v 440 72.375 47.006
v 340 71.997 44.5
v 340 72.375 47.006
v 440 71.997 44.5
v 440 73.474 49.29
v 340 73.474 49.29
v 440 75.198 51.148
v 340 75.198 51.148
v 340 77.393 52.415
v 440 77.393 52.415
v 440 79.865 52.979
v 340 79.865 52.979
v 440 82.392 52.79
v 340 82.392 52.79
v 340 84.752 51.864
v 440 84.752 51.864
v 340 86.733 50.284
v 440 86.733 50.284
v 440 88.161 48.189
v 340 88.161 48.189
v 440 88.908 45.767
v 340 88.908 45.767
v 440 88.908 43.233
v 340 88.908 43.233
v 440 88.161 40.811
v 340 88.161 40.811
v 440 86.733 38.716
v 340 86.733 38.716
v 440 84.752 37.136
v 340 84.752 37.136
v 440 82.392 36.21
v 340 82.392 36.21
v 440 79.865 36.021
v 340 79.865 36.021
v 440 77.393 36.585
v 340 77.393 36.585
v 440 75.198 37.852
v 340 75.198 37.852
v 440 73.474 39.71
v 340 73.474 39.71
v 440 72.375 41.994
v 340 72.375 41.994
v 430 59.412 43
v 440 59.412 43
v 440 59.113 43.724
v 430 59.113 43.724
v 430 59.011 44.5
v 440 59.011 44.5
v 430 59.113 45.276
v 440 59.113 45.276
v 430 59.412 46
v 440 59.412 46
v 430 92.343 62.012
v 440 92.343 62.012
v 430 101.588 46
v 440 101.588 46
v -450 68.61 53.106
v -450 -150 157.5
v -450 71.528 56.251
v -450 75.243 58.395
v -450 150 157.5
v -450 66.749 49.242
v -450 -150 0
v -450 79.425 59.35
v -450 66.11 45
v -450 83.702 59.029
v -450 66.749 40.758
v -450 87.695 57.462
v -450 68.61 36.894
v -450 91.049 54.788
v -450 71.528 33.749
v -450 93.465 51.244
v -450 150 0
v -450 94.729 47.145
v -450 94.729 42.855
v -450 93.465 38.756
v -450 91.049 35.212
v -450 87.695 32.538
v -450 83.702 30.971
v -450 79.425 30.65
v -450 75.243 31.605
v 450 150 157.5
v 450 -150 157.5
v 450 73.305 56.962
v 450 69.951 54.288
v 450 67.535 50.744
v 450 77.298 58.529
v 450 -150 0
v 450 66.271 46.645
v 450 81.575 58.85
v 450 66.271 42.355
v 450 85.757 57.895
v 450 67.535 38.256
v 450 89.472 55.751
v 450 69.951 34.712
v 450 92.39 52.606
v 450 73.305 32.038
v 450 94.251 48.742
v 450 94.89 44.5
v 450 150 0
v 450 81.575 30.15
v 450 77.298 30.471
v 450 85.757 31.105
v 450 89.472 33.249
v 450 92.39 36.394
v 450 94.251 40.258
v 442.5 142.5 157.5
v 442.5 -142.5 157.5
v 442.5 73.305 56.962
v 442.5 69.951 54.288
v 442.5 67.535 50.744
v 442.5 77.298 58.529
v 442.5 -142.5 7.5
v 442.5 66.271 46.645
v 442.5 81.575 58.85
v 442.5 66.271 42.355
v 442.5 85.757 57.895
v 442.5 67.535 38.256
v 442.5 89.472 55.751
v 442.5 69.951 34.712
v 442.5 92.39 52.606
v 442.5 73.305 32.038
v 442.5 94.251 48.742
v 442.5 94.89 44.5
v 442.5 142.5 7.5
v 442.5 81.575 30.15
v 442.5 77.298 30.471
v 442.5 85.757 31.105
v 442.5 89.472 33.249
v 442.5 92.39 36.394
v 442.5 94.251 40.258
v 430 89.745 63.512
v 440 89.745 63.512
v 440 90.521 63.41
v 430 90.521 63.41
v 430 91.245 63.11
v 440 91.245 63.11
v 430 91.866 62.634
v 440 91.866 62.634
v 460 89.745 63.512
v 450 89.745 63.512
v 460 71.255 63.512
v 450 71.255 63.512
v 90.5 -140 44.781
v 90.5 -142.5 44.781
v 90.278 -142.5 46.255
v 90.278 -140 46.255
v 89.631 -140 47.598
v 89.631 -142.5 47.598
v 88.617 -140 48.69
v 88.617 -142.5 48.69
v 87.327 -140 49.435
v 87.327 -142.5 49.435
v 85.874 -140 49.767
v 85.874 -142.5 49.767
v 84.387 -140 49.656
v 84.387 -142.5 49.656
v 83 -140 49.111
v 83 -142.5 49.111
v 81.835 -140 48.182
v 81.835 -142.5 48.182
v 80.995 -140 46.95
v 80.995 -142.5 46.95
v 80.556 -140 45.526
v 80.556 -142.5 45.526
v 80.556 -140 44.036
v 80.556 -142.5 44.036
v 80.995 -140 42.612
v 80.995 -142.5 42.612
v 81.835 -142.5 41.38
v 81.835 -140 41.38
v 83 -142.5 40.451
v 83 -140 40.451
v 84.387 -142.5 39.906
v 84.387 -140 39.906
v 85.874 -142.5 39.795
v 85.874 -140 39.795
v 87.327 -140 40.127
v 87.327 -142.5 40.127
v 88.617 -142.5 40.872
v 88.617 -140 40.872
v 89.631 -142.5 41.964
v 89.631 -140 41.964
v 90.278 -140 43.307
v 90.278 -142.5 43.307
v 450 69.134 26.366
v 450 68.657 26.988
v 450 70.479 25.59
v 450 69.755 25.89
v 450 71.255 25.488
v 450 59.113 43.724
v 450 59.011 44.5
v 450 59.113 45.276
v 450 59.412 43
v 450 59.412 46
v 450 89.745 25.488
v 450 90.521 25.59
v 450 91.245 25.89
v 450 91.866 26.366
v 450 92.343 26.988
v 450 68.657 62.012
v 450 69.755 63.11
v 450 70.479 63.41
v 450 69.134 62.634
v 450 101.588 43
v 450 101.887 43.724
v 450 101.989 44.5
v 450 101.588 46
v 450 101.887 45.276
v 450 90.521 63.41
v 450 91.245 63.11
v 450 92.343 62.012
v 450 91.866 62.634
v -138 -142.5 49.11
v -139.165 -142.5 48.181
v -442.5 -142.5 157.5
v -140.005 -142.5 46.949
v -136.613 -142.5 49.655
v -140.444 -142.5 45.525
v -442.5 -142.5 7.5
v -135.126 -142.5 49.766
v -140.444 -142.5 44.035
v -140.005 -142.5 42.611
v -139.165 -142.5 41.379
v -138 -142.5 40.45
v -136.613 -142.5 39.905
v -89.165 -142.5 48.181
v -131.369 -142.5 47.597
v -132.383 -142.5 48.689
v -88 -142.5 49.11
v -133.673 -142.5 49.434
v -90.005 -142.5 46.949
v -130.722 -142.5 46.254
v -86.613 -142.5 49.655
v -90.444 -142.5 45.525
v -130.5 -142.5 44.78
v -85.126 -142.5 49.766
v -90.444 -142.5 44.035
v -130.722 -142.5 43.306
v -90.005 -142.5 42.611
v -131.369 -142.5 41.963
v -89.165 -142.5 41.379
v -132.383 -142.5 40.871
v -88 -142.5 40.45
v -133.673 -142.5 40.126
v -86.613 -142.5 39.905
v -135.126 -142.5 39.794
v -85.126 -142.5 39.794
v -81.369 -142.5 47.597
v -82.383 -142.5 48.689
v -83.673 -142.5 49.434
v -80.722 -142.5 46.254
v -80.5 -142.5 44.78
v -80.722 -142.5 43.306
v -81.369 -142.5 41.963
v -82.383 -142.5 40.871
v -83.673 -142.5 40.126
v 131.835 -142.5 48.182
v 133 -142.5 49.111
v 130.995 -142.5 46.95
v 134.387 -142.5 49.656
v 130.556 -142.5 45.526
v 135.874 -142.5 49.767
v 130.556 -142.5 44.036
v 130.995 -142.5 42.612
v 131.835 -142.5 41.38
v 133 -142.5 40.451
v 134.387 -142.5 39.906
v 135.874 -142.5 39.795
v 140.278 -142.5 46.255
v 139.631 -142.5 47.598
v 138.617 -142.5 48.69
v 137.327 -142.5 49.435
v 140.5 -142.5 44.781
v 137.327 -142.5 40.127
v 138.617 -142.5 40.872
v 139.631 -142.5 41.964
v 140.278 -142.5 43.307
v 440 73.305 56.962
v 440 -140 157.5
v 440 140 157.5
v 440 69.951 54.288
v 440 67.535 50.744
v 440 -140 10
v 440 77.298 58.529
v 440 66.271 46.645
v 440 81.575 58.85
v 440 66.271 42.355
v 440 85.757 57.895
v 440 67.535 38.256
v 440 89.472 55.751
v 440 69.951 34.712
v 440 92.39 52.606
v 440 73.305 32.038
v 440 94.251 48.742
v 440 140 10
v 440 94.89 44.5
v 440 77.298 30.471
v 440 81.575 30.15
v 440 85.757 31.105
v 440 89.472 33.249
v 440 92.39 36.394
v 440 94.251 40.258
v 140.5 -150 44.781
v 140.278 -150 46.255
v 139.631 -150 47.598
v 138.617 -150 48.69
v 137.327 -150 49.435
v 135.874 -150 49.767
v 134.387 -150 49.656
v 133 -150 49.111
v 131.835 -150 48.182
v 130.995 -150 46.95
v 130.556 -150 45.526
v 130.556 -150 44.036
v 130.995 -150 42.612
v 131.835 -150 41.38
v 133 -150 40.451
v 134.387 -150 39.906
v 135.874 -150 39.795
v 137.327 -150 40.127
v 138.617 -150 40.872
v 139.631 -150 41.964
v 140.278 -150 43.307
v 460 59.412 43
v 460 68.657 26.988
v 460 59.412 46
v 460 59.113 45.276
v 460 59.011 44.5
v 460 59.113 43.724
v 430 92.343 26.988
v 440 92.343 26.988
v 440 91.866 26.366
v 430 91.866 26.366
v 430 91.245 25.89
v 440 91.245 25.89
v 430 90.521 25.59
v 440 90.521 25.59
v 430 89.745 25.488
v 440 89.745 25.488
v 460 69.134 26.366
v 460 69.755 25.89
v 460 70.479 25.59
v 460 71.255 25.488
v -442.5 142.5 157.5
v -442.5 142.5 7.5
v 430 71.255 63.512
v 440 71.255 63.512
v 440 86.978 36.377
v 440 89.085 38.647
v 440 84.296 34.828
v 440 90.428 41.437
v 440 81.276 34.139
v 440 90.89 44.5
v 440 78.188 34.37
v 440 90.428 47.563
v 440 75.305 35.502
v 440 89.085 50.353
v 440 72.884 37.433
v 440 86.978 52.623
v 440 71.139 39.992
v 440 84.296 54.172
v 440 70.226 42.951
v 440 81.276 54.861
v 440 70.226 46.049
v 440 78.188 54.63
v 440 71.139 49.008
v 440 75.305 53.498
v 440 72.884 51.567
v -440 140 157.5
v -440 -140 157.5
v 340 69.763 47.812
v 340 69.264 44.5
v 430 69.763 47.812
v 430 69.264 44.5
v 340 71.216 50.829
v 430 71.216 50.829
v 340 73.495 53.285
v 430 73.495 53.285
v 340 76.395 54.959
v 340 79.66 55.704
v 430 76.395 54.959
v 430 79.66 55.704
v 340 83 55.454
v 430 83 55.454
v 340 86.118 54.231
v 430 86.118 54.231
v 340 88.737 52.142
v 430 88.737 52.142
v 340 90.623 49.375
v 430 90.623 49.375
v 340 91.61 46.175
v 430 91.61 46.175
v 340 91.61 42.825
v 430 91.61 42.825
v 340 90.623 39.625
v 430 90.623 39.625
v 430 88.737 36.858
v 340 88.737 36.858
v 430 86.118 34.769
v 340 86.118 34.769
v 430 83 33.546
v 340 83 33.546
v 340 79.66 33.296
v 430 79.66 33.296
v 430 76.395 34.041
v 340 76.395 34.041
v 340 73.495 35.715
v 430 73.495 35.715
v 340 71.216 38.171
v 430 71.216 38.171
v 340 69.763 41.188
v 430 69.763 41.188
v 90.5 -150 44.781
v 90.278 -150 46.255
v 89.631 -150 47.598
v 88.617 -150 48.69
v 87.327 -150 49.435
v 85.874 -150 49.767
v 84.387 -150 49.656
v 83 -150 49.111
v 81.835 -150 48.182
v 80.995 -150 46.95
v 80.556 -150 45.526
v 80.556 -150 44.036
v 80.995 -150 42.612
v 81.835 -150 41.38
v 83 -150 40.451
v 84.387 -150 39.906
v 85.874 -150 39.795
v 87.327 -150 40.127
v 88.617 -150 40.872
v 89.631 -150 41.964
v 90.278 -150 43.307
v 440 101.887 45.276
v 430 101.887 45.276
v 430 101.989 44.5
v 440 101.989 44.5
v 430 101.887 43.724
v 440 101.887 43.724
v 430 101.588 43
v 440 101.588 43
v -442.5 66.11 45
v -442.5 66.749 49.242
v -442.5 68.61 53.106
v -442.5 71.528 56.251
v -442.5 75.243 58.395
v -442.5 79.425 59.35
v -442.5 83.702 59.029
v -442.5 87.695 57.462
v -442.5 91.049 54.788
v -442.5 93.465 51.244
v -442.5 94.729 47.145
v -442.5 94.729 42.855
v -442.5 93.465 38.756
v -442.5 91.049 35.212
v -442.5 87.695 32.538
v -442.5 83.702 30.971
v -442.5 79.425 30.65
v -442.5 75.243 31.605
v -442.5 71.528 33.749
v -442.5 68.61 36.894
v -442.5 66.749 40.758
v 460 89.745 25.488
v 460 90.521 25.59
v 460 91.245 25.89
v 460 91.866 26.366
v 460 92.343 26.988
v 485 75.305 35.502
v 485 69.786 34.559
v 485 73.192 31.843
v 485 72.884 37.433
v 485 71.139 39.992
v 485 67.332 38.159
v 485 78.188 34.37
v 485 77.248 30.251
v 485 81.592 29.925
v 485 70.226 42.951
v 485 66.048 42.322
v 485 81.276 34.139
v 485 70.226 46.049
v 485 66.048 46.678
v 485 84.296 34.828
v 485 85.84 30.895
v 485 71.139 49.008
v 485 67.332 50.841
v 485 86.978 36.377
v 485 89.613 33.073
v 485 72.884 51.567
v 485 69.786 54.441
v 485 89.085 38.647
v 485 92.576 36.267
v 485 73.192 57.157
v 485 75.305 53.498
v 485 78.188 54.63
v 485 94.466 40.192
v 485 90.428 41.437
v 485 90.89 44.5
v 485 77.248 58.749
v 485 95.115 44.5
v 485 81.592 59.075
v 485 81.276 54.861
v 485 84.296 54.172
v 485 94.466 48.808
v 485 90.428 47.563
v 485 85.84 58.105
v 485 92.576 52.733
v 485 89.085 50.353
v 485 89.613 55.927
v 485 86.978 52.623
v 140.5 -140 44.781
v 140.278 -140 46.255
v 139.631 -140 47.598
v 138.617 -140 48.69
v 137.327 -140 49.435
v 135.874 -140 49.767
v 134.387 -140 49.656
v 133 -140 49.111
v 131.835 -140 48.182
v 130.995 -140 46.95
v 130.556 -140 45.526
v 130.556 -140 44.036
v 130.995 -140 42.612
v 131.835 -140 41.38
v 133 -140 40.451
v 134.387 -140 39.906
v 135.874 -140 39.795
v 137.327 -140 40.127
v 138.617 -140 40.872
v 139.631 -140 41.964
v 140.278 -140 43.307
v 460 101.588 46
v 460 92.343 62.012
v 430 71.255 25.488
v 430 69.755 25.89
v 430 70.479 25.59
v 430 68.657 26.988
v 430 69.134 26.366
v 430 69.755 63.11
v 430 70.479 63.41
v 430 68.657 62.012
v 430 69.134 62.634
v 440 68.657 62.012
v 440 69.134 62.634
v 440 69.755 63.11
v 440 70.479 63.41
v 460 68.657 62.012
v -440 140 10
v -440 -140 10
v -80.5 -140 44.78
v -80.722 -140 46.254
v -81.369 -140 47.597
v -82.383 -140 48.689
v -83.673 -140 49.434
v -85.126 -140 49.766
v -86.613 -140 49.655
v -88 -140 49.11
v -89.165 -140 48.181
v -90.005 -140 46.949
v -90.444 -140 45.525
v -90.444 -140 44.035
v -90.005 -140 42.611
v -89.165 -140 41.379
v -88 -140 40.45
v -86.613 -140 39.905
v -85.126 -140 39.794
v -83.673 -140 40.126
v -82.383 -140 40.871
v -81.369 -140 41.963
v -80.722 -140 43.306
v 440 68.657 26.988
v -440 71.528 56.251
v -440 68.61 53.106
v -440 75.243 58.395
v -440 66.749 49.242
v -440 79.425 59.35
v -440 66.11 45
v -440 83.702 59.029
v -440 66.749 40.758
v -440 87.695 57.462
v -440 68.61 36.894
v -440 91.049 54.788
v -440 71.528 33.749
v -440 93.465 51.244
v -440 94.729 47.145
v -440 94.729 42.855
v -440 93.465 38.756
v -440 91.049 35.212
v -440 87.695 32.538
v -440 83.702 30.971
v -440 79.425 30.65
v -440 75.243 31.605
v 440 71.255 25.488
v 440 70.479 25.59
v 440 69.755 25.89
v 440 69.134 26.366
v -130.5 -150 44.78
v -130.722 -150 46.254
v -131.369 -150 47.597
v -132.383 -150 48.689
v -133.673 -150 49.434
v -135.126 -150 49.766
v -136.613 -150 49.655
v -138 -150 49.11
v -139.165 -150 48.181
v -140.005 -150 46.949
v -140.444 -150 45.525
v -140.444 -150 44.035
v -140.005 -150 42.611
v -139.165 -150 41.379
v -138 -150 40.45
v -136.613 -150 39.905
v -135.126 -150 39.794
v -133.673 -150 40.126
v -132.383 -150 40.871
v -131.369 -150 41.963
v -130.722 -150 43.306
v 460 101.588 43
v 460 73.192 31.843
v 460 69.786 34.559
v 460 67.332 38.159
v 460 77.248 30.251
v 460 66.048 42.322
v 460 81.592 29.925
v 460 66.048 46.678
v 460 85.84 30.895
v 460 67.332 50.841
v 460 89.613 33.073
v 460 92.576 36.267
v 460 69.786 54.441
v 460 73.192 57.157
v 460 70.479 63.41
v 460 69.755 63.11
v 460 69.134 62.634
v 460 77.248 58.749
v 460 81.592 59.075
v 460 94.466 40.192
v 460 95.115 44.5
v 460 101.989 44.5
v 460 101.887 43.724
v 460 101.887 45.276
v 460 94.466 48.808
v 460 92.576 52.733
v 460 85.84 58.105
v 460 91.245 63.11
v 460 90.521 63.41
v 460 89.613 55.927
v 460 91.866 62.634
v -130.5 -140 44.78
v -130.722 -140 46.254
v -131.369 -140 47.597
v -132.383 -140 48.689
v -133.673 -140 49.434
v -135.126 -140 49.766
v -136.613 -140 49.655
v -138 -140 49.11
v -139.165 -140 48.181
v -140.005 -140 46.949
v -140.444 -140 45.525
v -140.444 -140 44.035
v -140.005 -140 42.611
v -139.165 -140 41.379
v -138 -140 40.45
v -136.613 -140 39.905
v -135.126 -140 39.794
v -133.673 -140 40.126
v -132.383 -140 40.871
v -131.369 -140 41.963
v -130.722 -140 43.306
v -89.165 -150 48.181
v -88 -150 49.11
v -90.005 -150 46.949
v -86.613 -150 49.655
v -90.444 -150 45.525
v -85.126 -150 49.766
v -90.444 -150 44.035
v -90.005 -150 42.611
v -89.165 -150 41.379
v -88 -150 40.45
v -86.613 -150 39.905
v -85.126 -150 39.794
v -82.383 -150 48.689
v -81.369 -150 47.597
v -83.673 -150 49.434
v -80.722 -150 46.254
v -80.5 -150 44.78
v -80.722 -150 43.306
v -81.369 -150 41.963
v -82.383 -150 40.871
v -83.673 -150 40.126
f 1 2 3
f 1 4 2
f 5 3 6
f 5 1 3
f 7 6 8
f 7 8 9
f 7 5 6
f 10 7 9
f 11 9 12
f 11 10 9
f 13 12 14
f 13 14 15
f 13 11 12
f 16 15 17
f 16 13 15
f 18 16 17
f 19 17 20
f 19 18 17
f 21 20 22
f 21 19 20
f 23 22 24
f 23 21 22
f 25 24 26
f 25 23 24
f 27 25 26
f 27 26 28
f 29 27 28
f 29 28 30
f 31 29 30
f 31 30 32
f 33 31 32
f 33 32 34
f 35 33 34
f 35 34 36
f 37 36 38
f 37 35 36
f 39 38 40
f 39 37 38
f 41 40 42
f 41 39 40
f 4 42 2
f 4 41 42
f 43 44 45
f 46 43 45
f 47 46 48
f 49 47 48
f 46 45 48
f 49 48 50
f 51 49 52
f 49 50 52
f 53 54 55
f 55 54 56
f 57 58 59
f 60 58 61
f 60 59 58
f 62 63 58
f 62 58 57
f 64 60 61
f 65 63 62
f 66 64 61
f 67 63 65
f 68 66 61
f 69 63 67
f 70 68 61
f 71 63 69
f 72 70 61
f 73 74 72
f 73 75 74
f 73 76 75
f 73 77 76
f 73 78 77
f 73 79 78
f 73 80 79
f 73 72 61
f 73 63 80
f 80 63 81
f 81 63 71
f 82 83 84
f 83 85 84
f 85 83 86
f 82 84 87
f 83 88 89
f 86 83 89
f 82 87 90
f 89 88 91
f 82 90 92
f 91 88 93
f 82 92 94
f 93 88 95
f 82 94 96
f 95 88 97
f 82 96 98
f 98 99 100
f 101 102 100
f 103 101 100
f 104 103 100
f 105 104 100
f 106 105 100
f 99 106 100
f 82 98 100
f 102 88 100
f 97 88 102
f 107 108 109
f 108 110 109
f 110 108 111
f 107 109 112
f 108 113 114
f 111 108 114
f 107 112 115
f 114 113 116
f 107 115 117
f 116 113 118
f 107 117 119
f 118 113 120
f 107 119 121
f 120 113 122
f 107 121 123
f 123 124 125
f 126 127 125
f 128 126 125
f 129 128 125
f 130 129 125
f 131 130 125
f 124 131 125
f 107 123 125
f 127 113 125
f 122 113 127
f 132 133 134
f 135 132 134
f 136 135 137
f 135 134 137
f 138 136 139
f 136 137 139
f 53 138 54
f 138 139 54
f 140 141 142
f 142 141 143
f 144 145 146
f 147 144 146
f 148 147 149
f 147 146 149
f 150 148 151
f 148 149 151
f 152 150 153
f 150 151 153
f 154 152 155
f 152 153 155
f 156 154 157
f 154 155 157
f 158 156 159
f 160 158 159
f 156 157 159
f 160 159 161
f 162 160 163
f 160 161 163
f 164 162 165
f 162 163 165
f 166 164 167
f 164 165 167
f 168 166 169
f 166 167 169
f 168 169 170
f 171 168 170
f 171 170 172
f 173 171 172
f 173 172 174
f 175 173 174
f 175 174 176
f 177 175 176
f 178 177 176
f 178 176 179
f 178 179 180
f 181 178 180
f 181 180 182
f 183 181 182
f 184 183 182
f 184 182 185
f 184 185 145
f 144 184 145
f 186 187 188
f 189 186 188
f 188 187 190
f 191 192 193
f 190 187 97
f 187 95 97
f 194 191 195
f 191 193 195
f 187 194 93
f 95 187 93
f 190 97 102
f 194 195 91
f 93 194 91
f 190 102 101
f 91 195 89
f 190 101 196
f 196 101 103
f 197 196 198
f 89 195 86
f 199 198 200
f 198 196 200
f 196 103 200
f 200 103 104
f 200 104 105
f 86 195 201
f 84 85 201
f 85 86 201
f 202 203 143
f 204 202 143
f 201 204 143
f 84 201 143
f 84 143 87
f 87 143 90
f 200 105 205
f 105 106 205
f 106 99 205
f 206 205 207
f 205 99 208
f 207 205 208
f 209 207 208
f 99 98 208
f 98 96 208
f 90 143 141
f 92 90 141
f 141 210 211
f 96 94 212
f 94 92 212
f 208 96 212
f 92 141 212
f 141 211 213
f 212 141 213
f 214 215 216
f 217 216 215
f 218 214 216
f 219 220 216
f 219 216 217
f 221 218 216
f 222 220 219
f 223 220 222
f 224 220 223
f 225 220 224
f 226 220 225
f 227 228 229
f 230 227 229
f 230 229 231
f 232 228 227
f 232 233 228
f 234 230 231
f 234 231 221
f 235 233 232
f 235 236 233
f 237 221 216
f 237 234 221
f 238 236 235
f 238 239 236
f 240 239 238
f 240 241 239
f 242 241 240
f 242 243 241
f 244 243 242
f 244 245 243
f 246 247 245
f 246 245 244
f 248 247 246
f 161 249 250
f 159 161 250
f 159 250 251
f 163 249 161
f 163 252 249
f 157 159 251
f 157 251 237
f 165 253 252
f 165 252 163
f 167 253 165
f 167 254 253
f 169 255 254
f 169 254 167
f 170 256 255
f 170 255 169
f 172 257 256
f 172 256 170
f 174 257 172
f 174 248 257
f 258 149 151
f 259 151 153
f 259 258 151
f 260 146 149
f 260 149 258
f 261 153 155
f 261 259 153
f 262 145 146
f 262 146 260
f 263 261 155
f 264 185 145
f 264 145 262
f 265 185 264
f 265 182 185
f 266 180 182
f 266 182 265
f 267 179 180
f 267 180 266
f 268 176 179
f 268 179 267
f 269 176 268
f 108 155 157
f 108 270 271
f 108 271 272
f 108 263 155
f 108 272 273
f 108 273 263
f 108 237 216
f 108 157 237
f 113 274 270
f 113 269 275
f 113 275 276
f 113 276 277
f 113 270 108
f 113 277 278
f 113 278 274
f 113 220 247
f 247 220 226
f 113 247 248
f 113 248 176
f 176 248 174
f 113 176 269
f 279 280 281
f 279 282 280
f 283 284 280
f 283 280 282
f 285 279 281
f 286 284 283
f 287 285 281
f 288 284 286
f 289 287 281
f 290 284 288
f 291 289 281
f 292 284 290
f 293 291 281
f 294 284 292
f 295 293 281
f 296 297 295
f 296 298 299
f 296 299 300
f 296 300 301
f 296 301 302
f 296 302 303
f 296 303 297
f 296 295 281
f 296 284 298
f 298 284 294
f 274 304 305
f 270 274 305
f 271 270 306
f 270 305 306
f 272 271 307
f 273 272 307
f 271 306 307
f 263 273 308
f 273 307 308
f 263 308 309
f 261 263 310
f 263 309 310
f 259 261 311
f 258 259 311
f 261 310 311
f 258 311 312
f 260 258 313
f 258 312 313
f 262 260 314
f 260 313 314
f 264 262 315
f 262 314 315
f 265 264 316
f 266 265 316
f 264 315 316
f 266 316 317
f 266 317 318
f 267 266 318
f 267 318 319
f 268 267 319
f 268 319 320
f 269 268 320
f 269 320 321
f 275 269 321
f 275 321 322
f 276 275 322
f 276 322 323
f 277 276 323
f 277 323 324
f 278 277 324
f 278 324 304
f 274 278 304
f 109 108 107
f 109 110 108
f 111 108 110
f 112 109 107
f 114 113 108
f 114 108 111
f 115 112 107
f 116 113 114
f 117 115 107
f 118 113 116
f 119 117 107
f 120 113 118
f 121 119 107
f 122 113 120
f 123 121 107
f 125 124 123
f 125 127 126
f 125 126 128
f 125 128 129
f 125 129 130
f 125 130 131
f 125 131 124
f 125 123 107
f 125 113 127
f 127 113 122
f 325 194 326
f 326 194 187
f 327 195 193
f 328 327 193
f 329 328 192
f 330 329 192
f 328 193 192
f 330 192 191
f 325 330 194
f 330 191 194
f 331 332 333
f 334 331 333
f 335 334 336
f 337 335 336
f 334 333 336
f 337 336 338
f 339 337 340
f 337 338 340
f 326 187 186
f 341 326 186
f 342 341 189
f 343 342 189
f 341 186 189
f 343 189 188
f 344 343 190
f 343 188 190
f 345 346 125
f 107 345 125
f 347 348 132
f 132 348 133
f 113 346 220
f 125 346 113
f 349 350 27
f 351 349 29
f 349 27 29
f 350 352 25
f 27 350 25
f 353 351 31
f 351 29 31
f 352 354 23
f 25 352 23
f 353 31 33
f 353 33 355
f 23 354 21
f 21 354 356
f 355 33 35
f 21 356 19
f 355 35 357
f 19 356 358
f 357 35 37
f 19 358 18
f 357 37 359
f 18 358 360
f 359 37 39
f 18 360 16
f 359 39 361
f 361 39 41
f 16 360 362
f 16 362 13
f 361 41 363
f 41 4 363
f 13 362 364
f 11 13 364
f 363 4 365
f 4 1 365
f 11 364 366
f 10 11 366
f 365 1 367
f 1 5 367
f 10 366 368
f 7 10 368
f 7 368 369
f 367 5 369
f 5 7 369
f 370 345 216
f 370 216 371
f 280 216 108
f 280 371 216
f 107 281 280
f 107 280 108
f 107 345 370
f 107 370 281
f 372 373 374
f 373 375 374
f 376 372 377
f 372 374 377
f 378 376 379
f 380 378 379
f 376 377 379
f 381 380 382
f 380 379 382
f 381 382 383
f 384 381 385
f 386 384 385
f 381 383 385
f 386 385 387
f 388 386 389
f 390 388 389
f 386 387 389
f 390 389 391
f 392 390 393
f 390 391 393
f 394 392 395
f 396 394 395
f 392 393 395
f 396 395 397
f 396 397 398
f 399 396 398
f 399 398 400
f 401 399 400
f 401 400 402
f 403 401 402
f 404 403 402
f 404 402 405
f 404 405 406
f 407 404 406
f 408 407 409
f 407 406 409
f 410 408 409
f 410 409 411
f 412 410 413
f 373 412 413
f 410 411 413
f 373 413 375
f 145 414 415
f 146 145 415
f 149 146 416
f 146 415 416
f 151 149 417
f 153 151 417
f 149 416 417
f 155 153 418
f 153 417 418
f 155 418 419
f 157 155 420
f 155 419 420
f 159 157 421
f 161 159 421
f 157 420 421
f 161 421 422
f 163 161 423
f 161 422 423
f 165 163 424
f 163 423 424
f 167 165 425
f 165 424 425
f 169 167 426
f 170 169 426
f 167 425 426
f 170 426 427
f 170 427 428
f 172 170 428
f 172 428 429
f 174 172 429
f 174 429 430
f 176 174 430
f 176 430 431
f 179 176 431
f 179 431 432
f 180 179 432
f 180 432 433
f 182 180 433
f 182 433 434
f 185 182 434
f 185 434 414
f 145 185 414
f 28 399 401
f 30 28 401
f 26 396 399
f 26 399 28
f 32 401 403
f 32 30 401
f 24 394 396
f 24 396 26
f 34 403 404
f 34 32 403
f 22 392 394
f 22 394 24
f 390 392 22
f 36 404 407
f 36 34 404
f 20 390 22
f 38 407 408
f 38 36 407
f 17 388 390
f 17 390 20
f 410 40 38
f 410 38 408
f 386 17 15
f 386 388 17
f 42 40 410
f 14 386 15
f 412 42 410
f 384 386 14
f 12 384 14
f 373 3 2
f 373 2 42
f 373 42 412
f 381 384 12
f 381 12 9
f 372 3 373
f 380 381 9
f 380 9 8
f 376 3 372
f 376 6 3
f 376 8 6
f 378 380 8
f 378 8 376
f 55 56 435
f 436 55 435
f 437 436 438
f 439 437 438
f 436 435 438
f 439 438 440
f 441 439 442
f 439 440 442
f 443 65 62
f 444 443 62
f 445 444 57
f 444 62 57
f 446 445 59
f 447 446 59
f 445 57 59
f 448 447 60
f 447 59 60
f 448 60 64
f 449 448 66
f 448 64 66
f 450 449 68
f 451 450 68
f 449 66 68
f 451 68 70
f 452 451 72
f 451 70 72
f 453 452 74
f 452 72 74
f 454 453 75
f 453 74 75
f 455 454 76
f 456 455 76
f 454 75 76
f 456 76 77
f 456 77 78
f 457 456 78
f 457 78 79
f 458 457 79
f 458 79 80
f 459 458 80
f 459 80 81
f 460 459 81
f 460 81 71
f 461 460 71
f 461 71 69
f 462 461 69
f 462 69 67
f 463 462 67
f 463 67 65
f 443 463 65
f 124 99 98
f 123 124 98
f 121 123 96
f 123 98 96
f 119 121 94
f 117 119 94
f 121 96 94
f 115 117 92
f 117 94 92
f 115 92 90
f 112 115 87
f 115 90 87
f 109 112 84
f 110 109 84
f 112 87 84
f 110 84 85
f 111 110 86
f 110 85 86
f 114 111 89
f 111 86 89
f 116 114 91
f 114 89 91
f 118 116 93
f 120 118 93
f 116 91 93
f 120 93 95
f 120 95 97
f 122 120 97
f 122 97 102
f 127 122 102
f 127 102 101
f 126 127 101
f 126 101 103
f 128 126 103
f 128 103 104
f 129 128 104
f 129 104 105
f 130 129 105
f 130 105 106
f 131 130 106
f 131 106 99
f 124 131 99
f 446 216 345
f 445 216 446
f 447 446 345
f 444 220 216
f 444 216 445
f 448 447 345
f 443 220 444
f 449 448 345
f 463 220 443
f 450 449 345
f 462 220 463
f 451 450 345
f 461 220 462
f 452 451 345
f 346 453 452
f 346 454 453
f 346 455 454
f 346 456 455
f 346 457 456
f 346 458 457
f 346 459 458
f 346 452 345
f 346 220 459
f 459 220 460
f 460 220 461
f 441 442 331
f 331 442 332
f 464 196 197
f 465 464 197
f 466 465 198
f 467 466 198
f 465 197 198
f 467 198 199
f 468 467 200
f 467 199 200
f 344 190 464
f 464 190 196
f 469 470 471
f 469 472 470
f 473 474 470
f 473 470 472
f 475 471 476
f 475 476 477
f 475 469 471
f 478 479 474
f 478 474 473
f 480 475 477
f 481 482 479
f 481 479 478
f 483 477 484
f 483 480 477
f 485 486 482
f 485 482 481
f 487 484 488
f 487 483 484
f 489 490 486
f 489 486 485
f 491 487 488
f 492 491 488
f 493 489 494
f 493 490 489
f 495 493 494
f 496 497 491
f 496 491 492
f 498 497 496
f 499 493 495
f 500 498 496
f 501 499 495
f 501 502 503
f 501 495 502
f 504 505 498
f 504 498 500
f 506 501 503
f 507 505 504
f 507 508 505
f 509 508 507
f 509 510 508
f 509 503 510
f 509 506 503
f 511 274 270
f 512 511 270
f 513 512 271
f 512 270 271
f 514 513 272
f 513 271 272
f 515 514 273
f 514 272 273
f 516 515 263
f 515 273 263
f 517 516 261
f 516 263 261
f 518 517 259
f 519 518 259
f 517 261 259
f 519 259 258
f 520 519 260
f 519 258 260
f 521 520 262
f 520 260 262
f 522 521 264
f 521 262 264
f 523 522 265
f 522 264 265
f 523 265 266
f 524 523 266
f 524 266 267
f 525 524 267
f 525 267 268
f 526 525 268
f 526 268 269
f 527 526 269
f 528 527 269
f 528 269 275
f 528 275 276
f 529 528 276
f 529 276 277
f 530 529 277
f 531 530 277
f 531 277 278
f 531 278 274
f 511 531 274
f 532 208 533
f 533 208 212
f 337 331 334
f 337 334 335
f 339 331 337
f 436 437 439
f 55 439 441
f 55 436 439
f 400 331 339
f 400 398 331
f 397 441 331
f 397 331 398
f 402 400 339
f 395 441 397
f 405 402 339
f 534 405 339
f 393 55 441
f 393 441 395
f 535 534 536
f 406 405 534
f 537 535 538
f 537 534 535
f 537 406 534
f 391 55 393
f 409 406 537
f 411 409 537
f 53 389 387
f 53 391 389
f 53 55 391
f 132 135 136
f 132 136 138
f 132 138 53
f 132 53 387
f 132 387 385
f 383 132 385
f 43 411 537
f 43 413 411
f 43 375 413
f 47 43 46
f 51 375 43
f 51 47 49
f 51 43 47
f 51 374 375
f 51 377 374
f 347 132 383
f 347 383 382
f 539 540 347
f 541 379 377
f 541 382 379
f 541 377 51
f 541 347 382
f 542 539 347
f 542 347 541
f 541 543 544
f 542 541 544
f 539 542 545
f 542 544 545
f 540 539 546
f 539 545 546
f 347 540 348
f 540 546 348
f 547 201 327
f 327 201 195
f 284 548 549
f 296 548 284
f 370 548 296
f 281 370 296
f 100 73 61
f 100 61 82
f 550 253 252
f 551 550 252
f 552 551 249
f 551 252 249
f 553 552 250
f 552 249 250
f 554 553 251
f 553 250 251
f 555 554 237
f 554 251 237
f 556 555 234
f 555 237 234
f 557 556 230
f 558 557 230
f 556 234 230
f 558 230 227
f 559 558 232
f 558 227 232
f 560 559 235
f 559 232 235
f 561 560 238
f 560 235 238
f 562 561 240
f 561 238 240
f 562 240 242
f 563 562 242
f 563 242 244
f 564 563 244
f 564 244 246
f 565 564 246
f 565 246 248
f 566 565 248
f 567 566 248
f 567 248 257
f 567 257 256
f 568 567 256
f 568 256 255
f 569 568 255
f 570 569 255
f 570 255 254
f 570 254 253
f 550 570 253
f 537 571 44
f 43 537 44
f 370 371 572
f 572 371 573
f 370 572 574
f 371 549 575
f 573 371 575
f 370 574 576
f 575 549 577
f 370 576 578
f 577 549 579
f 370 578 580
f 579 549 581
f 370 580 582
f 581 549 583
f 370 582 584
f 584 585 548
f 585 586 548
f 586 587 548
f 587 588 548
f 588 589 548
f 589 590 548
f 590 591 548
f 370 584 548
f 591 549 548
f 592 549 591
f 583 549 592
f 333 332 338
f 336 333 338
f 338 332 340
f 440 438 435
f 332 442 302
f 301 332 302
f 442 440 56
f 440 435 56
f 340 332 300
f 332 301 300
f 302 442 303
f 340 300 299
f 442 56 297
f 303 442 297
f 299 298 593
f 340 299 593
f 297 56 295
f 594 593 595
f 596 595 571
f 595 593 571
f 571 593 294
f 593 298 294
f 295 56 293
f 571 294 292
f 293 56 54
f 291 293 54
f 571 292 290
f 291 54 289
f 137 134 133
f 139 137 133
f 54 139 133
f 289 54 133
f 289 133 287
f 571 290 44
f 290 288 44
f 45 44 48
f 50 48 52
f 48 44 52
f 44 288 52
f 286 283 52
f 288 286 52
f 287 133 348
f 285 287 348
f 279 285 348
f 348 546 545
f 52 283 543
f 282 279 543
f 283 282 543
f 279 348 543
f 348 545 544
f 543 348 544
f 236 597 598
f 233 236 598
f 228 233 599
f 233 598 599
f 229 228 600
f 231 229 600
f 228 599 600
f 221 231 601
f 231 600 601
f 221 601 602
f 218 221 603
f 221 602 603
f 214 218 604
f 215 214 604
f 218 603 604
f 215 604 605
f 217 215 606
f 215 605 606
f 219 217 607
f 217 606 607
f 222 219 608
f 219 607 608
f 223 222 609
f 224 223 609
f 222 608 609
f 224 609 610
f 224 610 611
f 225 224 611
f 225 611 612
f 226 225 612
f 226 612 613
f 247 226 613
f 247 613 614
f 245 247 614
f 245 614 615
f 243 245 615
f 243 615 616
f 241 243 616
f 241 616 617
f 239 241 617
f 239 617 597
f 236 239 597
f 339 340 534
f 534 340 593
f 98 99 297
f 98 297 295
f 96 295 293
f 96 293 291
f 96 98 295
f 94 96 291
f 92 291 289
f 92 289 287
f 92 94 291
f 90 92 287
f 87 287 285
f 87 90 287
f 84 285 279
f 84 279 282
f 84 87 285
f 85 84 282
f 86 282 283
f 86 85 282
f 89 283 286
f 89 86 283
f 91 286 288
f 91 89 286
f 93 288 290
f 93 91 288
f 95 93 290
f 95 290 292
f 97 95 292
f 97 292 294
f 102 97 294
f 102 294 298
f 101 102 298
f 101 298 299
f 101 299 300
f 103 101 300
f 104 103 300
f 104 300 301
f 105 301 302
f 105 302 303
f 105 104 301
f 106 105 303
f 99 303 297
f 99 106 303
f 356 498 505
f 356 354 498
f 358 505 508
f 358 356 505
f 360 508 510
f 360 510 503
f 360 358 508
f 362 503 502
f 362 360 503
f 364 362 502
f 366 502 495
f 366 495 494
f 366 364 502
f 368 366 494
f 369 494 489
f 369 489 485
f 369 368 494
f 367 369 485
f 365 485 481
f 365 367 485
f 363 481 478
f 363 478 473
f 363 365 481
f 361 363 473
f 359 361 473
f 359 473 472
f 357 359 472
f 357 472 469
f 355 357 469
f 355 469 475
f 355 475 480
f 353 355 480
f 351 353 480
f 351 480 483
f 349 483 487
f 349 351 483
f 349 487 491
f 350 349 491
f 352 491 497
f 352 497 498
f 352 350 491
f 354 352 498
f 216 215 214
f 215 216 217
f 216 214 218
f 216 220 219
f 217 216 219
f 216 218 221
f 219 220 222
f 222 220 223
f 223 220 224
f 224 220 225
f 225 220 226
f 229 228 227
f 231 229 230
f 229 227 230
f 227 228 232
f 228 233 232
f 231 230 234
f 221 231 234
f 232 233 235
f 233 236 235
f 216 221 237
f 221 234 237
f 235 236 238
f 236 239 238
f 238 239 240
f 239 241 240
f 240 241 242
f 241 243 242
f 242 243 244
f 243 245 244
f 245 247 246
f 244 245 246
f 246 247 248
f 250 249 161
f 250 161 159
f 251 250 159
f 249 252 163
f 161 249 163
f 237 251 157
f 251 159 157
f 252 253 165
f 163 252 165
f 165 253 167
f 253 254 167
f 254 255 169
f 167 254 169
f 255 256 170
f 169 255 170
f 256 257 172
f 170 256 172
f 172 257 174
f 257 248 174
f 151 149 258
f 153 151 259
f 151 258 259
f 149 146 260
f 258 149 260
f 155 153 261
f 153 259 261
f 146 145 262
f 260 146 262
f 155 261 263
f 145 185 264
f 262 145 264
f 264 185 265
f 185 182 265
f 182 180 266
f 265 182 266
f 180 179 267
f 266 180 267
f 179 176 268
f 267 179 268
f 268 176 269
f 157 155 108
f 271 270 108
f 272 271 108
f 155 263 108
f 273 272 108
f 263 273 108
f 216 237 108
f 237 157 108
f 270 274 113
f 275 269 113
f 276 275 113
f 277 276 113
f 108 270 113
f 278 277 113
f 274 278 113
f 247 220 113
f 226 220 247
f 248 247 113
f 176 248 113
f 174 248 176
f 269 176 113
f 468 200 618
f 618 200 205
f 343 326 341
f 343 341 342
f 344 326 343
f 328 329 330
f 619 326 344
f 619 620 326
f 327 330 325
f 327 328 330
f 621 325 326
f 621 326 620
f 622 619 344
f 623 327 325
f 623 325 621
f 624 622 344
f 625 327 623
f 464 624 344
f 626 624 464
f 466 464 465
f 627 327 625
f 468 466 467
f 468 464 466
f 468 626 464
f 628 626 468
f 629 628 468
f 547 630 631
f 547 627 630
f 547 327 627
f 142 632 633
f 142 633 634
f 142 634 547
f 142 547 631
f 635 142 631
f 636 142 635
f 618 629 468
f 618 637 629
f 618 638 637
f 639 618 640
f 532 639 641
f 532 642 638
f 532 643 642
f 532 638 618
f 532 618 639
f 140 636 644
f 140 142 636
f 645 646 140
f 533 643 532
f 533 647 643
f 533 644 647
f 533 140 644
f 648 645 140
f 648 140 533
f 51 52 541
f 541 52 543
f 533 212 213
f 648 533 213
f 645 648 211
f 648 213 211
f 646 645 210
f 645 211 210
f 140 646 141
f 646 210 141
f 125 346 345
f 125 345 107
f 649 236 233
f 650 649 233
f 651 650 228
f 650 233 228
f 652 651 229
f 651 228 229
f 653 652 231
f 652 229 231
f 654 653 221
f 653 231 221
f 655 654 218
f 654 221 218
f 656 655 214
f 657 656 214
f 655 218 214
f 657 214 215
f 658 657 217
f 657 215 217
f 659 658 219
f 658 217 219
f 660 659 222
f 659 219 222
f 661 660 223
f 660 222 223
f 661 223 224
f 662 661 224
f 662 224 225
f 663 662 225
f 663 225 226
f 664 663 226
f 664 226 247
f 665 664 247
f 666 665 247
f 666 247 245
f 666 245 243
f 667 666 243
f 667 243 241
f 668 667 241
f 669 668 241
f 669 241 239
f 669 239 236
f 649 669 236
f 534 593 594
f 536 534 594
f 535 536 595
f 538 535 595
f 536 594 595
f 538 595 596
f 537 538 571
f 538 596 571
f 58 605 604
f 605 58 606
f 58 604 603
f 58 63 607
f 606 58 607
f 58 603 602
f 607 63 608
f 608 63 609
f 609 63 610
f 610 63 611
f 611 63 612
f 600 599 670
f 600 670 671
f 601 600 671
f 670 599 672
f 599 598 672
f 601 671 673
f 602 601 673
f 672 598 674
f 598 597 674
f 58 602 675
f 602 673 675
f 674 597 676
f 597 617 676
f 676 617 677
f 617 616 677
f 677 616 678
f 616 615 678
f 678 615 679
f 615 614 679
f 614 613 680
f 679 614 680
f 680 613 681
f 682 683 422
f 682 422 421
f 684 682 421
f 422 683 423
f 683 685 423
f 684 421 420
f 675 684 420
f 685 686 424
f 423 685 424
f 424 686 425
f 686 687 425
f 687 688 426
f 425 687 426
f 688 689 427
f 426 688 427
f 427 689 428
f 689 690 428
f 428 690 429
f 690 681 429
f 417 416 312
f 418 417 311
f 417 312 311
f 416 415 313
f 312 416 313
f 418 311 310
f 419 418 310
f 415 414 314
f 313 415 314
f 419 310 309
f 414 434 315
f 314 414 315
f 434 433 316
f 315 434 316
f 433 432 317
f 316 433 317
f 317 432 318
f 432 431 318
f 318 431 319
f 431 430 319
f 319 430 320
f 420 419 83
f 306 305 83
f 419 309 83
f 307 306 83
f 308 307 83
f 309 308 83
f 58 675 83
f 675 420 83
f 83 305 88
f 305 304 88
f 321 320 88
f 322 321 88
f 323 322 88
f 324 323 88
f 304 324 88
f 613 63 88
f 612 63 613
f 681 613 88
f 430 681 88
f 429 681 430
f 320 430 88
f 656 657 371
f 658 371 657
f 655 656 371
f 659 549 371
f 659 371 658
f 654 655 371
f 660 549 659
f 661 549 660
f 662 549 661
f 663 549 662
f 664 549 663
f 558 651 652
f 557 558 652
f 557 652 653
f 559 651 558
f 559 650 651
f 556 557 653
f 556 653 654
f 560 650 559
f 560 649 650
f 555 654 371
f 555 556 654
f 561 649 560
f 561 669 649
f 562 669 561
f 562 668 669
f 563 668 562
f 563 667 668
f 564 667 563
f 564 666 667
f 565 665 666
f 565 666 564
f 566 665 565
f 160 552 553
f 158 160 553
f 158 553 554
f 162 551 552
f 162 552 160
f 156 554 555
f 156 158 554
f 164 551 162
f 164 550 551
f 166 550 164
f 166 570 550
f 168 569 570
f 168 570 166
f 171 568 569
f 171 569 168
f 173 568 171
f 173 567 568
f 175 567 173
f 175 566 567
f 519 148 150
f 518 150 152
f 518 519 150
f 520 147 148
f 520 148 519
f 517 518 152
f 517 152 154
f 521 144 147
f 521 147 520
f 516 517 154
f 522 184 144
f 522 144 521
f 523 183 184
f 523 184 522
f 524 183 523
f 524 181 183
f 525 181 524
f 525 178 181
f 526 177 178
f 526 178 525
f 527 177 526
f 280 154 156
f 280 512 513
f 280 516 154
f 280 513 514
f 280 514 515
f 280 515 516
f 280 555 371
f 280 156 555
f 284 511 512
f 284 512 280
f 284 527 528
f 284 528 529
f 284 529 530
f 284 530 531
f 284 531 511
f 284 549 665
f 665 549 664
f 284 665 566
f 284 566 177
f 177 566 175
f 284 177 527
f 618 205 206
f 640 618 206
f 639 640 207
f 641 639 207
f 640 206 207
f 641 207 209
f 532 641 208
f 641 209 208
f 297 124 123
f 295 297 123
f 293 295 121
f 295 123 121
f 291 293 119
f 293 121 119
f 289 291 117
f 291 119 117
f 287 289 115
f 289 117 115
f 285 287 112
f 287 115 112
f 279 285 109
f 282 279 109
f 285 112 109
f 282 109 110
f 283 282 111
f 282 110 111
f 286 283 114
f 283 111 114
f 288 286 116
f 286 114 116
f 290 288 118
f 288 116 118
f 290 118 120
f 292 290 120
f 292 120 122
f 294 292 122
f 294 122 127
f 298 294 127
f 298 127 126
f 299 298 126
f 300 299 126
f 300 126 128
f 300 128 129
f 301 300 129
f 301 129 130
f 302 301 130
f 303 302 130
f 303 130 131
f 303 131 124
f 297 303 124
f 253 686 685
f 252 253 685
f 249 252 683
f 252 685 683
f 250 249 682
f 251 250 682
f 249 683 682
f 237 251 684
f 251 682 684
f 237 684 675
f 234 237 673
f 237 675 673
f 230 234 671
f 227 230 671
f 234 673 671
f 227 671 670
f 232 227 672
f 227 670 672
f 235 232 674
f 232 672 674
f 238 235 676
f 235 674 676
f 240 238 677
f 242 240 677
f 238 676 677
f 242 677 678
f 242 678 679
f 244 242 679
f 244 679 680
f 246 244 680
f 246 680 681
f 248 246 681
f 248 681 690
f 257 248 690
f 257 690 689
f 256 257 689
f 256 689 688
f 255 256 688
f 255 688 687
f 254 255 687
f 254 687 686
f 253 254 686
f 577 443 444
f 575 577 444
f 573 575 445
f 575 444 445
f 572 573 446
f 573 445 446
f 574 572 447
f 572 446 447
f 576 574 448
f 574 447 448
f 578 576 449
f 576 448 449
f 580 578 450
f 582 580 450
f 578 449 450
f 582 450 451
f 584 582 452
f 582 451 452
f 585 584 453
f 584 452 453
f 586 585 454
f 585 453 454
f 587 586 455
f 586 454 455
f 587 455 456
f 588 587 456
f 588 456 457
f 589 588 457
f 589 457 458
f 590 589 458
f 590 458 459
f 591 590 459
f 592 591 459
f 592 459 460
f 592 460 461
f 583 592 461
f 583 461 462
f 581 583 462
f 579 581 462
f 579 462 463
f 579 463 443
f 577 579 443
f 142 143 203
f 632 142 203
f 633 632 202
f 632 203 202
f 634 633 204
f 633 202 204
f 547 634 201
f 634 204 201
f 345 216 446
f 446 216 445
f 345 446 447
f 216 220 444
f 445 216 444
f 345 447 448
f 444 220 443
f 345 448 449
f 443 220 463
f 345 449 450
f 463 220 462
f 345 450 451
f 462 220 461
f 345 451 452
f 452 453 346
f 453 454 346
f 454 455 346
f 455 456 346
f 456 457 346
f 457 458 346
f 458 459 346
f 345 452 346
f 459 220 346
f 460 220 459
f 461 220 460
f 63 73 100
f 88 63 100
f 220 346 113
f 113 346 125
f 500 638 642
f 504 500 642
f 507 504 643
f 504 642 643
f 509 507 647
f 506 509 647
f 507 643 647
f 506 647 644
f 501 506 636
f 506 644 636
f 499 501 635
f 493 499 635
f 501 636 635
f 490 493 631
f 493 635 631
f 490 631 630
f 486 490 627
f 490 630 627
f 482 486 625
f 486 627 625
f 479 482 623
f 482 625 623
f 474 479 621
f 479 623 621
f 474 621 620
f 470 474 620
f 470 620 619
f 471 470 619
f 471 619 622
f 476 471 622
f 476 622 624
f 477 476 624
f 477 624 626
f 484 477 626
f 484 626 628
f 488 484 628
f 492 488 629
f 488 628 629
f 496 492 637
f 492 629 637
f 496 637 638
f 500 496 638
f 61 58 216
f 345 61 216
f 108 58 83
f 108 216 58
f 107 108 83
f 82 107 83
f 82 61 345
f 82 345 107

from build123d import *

# Parameters (mm, degrees)
F0_W      = 900
F0_H      = 300
F1_DEPTH  = 7.5
F2_W      = 900
F2_H      = 300
F2_W_2    = 885
F2_H_2    = 285
F3_DEPTH  = 150
F4_DEPTH  = 2.5
F5_W      = 885
F5_H      = 285
F5_W_2    = 880
F5_H_2    = 280
F6_DEPTH  = 147.5
F7_R      = 5
F8_DEPTH  = 25
F9_R      = 14.39
F10_DEPTH = 500
F11_R     = 14.39
F12_DEPTH = 25
F13_R     = 14.39
F13_R_2   = 10.39
F14_DEPTH = 10
F15_R     = 10.39
F16_DEPTH = 10
F17_R     = 14.6154428136
F17_R_2   = 10.39
F18_DEPTH = 25
F19_R     = 11.2359155228
F19_R_2   = 8.5030368104
F20_DEPTH = 50
F21_R     = 11.2359155228
F22_DEPTH = 10
F23_DEPTH = 50


with BuildPart() as f1:
    # F0 (on Top) → F1 (new body)
    with BuildSketch(Plane.XY):
        Rectangle(F0_W, F0_H)
    extrude(amount=F1_DEPTH)

    # F2 (on face) → F3 (join)
    with BuildSketch(Plane.XY.offset(7.5)):
        Rectangle(F2_W, F2_H)
        Rectangle(F2_W_2, F2_H_2, mode=Mode.SUBTRACT)
    extrude(amount=F3_DEPTH)


with BuildPart() as f4:
    # F4 (new): a face of the model
    f4_faces = [f1.part.faces().sort_by_distance(p)[0] for p in [
        (0, 0, 7.5),
    ]]
    extrude(f4_faces, amount=F4_DEPTH)

    # F5 (on face) → F6 (join)
    with BuildSketch(Plane.XY.offset(10)):
        Rectangle(F5_W, F5_H)
        Rectangle(F5_W_2, F5_H_2, mode=Mode.SUBTRACT)
    extrude(amount=F6_DEPTH)


with BuildPart() as f8_tool:
    # F7 (on face) → F8 (new body)
    with BuildSketch(Plane.XZ.offset(150)):
        with Locations((85.5, 44.781)):
            Circle(F7_R)
        with Locations((135.5, 44.781)):
            Circle(F7_R)
        with Locations((-85.5, 44.78)):
            Circle(F7_R)
        with Locations((-135.5, 44.78)):
            Circle(F7_R)
    extrude(amount=-F8_DEPTH)


with BuildPart() as f1_1:
    add(f1.part)

    # F8: cut by f8_tool
    add(f8_tool.part, mode=Mode.SUBTRACT)


with BuildPart() as f4_1:
    add(f4.part)

    # F8: cut by f8_tool
    add(f8_tool.part, mode=Mode.SUBTRACT)


with BuildPart() as f10_tool:
    # F9 (on face) → F10 (new body)
    with BuildSketch(Plane(origin=(-450, 0, 0), x_dir=(0, -1, 0), z_dir=(-1, 0, 0))):
        with Locations((-80.5, 45)):
            Circle(F9_R)
    extrude(amount=-F10_DEPTH)


with BuildPart() as f1_2:
    add(f1_1.part)

    # F10: cut by f10_tool
    add(f10_tool.part, mode=Mode.SUBTRACT)


with BuildPart() as f4_2:
    add(f4_1.part)

    # F10: cut by f10_tool
    add(f10_tool.part, mode=Mode.SUBTRACT)


with BuildPart() as f12_tool:
    # F11 (on face) → F12 (new body)
    with BuildSketch(Plane.YZ.offset(450)):
        with Locations((80.5, 44.5)):
            Circle(F11_R)
    extrude(amount=-F12_DEPTH)


with BuildPart() as f1_3:
    add(f1_2.part)

    # F12: cut by f12_tool
    add(f12_tool.part, mode=Mode.SUBTRACT)


with BuildPart() as f4_3:
    add(f4_2.part)

    # F12: cut by f12_tool
    add(f12_tool.part, mode=Mode.SUBTRACT)


with BuildPart() as f14:
    # F13 (on face) → F14 (new body)
    with BuildSketch(Plane.YZ.offset(450)):
        with Locations((80.5, 44.5)):
            Circle(F13_R)
        with Locations((80.5, 44.5)):
            Circle(F13_R_2, mode=Mode.SUBTRACT)
    extrude(amount=-F14_DEPTH)

    # F15 (on face) → F16 (join)
    with BuildSketch(Plane.YZ.offset(450)):
        with BuildLine():
            Line((89.7447234463, 63.5123307109), (71.2552765537, 63.5123307109))
            ThreePointArc((71.2552765537, 63.5123307109), (69.7552765537, 63.1104069222), (68.6572003424, 62.0123307109))
            Line((68.6572003424, 62.0123307109), (59.4124768961, 46))
            ThreePointArc((59.4124768961, 46), (59.0105531074, 44.5), (59.4124768961, 43))
            Line((59.4124768961, 43), (68.6572003424, 26.9876692891))
            ThreePointArc((68.6572003424, 26.9876692891), (69.7552765537, 25.8895930778), (71.2552765537, 25.4876692891))
            Line((71.2552765537, 25.4876692891), (89.7447234463, 25.4876692891))
            ThreePointArc((89.7447234463, 25.4876692891), (91.2447234463, 25.8895930778), (92.3427996576, 26.9876692891))
            Line((92.3427996576, 26.9876692891), (101.5875231039, 43))
            ThreePointArc((101.5875231039, 43), (101.9894468926, 44.5), (101.5875231039, 46))
            Line((101.5875231039, 46), (92.3427996576, 62.0123307109))
            ThreePointArc((92.3427996576, 62.0123307109), (91.2447234463, 63.1104069222), (89.7447234463, 63.5123307109))
        make_face()
        with Locations((80.5, 44.5)):
            Circle(F15_R, mode=Mode.SUBTRACT)
    extrude(amount=F16_DEPTH)

    # F17 (on face) → F18 (join)
    with BuildSketch(Plane.YZ.offset(460)):
        with Locations((80.5, 44.5)):
            Circle(F17_R)
        with Locations((80.5, 44.5)):
            Circle(F17_R_2, mode=Mode.SUBTRACT)
    extrude(amount=F18_DEPTH)

    # F19 (on face) → F20 (join)
    with BuildSketch(Plane(origin=(440, 0, 0), x_dir=(0, -1, 0), z_dir=(-1, 0, 0))):
        with Locations((-80.5, 44.5)):
            Circle(F19_R)
        with Locations((-80.5, 44.5)):
            Circle(F19_R_2, mode=Mode.SUBTRACT)
    extrude(amount=F20_DEPTH)

    # F21 (on face) → F22 (join)
    with BuildSketch(Plane(origin=(440, 0, 0), x_dir=(0, -1, 0), z_dir=(-1, 0, 0))):
        with BuildLine():
            Line((-71.2552765537, 63.5123307109), (-89.7447234463, 63.5123307109))
            ThreePointArc((-89.7447234463, 63.5123307109), (-91.2447234463, 63.1104069222), (-92.3427996576, 62.0123307109))
            Line((-92.3427996576, 62.0123307109), (-101.5875231039, 46))
            ThreePointArc((-101.5875231039, 46), (-101.9894468926, 44.5), (-101.5875231039, 43))
            Line((-101.5875231039, 43), (-92.3427996576, 26.9876692891))
            ThreePointArc((-92.3427996576, 26.9876692891), (-91.2447234463, 25.8895930778), (-89.7447234463, 25.4876692891))
            Line((-89.7447234463, 25.4876692891), (-71.2552765537, 25.4876692891))
            ThreePointArc((-71.2552765537, 25.4876692891), (-69.7552765537, 25.8895930778), (-68.6572003424, 26.9876692891))
            Line((-68.6572003424, 26.9876692891), (-59.4124768961, 43))
            ThreePointArc((-59.4124768961, 43), (-59.0105531074, 44.5), (-59.4124768961, 46))
            Line((-59.4124768961, 46), (-68.6572003424, 62.0123307109))
            ThreePointArc((-68.6572003424, 62.0123307109), (-69.7552765537, 63.1104069222), (-71.2552765537, 63.5123307109))
        make_face()
        with Locations((-80.5, 44.5)):
            Circle(F21_R, mode=Mode.SUBTRACT)
    extrude(amount=F22_DEPTH)

    # F23 (add): a face of the model
    f23_faces = [f14.faces().sort_by_distance(p)[0] for p in [
        (390, 91.4181158404, 44.5),
    ]]
    extrude(f23_faces, amount=F23_DEPTH)


solid = Compound([f1_3.part, f4_3.part, f14.part])
